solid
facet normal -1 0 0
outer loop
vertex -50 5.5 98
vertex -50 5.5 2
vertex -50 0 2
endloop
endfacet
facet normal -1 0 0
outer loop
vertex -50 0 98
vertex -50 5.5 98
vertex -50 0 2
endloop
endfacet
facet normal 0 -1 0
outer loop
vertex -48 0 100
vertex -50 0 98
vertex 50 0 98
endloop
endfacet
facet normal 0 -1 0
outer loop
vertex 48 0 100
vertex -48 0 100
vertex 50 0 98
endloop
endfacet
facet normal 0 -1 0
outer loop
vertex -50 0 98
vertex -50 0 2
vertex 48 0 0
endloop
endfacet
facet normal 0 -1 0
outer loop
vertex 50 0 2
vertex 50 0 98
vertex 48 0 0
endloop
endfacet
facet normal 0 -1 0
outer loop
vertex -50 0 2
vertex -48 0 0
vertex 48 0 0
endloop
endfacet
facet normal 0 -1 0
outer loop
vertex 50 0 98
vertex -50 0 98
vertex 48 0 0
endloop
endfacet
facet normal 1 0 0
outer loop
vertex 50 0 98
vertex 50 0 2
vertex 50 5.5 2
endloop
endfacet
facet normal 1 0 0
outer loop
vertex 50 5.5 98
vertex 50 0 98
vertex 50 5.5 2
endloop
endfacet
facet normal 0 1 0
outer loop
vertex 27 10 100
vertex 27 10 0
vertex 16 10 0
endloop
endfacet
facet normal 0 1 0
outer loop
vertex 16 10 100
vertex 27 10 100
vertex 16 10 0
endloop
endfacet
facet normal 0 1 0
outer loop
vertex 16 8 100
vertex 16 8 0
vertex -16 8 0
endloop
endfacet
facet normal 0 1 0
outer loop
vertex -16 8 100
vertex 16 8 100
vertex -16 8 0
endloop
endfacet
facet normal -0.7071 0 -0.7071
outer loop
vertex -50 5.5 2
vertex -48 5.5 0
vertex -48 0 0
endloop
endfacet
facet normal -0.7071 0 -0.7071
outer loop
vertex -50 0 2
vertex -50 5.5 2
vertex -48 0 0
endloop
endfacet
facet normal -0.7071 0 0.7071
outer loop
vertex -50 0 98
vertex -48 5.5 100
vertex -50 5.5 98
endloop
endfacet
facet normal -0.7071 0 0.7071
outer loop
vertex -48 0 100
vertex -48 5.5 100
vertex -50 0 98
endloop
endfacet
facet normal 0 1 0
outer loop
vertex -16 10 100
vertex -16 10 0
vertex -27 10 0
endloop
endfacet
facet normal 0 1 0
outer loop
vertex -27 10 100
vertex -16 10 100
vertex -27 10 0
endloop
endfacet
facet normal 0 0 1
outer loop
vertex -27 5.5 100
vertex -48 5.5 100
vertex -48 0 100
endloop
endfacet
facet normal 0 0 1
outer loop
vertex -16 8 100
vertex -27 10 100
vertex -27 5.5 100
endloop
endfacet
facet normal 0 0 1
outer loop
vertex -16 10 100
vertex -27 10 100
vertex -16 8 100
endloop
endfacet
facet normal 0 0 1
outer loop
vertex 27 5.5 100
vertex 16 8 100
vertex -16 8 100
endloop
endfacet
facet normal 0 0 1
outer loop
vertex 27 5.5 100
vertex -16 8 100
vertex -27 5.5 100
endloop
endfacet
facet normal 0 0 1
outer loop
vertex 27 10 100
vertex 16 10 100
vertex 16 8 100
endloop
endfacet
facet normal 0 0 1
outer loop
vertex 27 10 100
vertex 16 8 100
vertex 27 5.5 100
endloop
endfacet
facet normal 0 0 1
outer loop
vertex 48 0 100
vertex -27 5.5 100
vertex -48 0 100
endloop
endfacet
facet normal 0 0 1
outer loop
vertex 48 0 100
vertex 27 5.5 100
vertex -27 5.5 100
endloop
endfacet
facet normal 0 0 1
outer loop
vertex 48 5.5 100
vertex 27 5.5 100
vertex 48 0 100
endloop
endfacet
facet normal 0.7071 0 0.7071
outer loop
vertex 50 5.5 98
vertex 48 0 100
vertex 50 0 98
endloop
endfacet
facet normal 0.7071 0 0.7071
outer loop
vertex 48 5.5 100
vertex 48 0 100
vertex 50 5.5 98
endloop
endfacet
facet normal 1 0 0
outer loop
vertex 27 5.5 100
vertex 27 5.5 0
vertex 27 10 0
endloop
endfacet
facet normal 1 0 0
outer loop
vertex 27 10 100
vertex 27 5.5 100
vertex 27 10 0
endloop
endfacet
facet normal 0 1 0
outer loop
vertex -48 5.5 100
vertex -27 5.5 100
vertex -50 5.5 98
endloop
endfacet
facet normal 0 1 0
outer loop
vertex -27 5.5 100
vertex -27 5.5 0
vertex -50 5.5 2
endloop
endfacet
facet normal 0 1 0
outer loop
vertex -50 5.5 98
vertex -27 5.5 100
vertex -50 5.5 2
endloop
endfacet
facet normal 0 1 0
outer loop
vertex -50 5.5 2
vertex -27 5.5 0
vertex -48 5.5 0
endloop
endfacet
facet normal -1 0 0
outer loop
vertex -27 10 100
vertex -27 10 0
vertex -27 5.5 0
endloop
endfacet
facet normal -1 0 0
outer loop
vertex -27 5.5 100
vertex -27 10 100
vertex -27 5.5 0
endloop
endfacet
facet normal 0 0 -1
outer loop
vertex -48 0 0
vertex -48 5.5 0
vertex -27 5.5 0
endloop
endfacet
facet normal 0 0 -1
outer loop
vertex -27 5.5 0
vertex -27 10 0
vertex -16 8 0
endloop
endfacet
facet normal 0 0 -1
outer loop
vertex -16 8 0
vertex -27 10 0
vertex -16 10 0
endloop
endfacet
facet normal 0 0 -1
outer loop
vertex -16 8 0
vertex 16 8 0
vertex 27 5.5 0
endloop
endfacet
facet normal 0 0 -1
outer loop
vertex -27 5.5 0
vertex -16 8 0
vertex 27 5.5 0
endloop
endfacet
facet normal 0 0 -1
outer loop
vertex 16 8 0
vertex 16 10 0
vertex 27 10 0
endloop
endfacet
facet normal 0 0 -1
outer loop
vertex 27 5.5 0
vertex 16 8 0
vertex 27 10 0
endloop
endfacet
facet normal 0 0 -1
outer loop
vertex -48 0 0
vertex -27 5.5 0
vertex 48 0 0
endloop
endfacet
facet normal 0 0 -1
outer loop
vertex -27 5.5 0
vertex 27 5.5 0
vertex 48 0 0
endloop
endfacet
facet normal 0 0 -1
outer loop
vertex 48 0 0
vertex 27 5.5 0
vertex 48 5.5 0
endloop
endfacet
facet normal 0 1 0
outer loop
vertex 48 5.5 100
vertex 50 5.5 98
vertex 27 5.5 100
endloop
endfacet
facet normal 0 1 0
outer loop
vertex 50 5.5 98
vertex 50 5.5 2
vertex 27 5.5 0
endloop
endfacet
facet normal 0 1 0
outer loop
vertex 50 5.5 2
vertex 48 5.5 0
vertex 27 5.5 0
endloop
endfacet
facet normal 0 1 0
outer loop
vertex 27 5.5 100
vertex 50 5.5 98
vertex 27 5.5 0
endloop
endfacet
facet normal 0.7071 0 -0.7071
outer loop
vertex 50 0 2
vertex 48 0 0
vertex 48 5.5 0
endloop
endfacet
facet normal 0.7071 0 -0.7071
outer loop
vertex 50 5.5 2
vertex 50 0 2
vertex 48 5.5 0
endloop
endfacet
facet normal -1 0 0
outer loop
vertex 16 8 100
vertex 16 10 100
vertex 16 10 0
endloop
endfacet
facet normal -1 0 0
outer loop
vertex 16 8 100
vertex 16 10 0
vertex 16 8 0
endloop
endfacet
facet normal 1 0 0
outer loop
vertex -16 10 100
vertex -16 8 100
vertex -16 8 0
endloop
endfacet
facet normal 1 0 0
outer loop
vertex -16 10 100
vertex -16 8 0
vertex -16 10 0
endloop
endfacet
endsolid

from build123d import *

# Parameters (mm, degrees)
BOSS_EXTRUDE1_DEPTH = 100
CHAMFER1_SIZE       = 2


with BuildPart() as part:
    # Sketch2 → Boss-Extrude1 (new body)
    with BuildSketch(Plane.XY):
        Polygon((-50, 0), (50, 0), (50, 5.5), (27, 5.5), (27, 10), (16, 10), (16, 8), (-16, 8), (-16, 10), (-27, 10), (-27, 5.5), (-50, 5.5), align=None)
    extrude(amount=BOSS_EXTRUDE1_DEPTH)

    # Chamfer1
    chamfer1_edges = [part.edges().sort_by_distance(p)[0] for p in [
        (-50, 2.75, 0),
        (50, 2.75, 0),
        (-50, 2.75, 100),
        (50, 2.75, 100),
    ]]
    chamfer(chamfer1_edges, length=CHAMFER1_SIZE)


solid = part.part
